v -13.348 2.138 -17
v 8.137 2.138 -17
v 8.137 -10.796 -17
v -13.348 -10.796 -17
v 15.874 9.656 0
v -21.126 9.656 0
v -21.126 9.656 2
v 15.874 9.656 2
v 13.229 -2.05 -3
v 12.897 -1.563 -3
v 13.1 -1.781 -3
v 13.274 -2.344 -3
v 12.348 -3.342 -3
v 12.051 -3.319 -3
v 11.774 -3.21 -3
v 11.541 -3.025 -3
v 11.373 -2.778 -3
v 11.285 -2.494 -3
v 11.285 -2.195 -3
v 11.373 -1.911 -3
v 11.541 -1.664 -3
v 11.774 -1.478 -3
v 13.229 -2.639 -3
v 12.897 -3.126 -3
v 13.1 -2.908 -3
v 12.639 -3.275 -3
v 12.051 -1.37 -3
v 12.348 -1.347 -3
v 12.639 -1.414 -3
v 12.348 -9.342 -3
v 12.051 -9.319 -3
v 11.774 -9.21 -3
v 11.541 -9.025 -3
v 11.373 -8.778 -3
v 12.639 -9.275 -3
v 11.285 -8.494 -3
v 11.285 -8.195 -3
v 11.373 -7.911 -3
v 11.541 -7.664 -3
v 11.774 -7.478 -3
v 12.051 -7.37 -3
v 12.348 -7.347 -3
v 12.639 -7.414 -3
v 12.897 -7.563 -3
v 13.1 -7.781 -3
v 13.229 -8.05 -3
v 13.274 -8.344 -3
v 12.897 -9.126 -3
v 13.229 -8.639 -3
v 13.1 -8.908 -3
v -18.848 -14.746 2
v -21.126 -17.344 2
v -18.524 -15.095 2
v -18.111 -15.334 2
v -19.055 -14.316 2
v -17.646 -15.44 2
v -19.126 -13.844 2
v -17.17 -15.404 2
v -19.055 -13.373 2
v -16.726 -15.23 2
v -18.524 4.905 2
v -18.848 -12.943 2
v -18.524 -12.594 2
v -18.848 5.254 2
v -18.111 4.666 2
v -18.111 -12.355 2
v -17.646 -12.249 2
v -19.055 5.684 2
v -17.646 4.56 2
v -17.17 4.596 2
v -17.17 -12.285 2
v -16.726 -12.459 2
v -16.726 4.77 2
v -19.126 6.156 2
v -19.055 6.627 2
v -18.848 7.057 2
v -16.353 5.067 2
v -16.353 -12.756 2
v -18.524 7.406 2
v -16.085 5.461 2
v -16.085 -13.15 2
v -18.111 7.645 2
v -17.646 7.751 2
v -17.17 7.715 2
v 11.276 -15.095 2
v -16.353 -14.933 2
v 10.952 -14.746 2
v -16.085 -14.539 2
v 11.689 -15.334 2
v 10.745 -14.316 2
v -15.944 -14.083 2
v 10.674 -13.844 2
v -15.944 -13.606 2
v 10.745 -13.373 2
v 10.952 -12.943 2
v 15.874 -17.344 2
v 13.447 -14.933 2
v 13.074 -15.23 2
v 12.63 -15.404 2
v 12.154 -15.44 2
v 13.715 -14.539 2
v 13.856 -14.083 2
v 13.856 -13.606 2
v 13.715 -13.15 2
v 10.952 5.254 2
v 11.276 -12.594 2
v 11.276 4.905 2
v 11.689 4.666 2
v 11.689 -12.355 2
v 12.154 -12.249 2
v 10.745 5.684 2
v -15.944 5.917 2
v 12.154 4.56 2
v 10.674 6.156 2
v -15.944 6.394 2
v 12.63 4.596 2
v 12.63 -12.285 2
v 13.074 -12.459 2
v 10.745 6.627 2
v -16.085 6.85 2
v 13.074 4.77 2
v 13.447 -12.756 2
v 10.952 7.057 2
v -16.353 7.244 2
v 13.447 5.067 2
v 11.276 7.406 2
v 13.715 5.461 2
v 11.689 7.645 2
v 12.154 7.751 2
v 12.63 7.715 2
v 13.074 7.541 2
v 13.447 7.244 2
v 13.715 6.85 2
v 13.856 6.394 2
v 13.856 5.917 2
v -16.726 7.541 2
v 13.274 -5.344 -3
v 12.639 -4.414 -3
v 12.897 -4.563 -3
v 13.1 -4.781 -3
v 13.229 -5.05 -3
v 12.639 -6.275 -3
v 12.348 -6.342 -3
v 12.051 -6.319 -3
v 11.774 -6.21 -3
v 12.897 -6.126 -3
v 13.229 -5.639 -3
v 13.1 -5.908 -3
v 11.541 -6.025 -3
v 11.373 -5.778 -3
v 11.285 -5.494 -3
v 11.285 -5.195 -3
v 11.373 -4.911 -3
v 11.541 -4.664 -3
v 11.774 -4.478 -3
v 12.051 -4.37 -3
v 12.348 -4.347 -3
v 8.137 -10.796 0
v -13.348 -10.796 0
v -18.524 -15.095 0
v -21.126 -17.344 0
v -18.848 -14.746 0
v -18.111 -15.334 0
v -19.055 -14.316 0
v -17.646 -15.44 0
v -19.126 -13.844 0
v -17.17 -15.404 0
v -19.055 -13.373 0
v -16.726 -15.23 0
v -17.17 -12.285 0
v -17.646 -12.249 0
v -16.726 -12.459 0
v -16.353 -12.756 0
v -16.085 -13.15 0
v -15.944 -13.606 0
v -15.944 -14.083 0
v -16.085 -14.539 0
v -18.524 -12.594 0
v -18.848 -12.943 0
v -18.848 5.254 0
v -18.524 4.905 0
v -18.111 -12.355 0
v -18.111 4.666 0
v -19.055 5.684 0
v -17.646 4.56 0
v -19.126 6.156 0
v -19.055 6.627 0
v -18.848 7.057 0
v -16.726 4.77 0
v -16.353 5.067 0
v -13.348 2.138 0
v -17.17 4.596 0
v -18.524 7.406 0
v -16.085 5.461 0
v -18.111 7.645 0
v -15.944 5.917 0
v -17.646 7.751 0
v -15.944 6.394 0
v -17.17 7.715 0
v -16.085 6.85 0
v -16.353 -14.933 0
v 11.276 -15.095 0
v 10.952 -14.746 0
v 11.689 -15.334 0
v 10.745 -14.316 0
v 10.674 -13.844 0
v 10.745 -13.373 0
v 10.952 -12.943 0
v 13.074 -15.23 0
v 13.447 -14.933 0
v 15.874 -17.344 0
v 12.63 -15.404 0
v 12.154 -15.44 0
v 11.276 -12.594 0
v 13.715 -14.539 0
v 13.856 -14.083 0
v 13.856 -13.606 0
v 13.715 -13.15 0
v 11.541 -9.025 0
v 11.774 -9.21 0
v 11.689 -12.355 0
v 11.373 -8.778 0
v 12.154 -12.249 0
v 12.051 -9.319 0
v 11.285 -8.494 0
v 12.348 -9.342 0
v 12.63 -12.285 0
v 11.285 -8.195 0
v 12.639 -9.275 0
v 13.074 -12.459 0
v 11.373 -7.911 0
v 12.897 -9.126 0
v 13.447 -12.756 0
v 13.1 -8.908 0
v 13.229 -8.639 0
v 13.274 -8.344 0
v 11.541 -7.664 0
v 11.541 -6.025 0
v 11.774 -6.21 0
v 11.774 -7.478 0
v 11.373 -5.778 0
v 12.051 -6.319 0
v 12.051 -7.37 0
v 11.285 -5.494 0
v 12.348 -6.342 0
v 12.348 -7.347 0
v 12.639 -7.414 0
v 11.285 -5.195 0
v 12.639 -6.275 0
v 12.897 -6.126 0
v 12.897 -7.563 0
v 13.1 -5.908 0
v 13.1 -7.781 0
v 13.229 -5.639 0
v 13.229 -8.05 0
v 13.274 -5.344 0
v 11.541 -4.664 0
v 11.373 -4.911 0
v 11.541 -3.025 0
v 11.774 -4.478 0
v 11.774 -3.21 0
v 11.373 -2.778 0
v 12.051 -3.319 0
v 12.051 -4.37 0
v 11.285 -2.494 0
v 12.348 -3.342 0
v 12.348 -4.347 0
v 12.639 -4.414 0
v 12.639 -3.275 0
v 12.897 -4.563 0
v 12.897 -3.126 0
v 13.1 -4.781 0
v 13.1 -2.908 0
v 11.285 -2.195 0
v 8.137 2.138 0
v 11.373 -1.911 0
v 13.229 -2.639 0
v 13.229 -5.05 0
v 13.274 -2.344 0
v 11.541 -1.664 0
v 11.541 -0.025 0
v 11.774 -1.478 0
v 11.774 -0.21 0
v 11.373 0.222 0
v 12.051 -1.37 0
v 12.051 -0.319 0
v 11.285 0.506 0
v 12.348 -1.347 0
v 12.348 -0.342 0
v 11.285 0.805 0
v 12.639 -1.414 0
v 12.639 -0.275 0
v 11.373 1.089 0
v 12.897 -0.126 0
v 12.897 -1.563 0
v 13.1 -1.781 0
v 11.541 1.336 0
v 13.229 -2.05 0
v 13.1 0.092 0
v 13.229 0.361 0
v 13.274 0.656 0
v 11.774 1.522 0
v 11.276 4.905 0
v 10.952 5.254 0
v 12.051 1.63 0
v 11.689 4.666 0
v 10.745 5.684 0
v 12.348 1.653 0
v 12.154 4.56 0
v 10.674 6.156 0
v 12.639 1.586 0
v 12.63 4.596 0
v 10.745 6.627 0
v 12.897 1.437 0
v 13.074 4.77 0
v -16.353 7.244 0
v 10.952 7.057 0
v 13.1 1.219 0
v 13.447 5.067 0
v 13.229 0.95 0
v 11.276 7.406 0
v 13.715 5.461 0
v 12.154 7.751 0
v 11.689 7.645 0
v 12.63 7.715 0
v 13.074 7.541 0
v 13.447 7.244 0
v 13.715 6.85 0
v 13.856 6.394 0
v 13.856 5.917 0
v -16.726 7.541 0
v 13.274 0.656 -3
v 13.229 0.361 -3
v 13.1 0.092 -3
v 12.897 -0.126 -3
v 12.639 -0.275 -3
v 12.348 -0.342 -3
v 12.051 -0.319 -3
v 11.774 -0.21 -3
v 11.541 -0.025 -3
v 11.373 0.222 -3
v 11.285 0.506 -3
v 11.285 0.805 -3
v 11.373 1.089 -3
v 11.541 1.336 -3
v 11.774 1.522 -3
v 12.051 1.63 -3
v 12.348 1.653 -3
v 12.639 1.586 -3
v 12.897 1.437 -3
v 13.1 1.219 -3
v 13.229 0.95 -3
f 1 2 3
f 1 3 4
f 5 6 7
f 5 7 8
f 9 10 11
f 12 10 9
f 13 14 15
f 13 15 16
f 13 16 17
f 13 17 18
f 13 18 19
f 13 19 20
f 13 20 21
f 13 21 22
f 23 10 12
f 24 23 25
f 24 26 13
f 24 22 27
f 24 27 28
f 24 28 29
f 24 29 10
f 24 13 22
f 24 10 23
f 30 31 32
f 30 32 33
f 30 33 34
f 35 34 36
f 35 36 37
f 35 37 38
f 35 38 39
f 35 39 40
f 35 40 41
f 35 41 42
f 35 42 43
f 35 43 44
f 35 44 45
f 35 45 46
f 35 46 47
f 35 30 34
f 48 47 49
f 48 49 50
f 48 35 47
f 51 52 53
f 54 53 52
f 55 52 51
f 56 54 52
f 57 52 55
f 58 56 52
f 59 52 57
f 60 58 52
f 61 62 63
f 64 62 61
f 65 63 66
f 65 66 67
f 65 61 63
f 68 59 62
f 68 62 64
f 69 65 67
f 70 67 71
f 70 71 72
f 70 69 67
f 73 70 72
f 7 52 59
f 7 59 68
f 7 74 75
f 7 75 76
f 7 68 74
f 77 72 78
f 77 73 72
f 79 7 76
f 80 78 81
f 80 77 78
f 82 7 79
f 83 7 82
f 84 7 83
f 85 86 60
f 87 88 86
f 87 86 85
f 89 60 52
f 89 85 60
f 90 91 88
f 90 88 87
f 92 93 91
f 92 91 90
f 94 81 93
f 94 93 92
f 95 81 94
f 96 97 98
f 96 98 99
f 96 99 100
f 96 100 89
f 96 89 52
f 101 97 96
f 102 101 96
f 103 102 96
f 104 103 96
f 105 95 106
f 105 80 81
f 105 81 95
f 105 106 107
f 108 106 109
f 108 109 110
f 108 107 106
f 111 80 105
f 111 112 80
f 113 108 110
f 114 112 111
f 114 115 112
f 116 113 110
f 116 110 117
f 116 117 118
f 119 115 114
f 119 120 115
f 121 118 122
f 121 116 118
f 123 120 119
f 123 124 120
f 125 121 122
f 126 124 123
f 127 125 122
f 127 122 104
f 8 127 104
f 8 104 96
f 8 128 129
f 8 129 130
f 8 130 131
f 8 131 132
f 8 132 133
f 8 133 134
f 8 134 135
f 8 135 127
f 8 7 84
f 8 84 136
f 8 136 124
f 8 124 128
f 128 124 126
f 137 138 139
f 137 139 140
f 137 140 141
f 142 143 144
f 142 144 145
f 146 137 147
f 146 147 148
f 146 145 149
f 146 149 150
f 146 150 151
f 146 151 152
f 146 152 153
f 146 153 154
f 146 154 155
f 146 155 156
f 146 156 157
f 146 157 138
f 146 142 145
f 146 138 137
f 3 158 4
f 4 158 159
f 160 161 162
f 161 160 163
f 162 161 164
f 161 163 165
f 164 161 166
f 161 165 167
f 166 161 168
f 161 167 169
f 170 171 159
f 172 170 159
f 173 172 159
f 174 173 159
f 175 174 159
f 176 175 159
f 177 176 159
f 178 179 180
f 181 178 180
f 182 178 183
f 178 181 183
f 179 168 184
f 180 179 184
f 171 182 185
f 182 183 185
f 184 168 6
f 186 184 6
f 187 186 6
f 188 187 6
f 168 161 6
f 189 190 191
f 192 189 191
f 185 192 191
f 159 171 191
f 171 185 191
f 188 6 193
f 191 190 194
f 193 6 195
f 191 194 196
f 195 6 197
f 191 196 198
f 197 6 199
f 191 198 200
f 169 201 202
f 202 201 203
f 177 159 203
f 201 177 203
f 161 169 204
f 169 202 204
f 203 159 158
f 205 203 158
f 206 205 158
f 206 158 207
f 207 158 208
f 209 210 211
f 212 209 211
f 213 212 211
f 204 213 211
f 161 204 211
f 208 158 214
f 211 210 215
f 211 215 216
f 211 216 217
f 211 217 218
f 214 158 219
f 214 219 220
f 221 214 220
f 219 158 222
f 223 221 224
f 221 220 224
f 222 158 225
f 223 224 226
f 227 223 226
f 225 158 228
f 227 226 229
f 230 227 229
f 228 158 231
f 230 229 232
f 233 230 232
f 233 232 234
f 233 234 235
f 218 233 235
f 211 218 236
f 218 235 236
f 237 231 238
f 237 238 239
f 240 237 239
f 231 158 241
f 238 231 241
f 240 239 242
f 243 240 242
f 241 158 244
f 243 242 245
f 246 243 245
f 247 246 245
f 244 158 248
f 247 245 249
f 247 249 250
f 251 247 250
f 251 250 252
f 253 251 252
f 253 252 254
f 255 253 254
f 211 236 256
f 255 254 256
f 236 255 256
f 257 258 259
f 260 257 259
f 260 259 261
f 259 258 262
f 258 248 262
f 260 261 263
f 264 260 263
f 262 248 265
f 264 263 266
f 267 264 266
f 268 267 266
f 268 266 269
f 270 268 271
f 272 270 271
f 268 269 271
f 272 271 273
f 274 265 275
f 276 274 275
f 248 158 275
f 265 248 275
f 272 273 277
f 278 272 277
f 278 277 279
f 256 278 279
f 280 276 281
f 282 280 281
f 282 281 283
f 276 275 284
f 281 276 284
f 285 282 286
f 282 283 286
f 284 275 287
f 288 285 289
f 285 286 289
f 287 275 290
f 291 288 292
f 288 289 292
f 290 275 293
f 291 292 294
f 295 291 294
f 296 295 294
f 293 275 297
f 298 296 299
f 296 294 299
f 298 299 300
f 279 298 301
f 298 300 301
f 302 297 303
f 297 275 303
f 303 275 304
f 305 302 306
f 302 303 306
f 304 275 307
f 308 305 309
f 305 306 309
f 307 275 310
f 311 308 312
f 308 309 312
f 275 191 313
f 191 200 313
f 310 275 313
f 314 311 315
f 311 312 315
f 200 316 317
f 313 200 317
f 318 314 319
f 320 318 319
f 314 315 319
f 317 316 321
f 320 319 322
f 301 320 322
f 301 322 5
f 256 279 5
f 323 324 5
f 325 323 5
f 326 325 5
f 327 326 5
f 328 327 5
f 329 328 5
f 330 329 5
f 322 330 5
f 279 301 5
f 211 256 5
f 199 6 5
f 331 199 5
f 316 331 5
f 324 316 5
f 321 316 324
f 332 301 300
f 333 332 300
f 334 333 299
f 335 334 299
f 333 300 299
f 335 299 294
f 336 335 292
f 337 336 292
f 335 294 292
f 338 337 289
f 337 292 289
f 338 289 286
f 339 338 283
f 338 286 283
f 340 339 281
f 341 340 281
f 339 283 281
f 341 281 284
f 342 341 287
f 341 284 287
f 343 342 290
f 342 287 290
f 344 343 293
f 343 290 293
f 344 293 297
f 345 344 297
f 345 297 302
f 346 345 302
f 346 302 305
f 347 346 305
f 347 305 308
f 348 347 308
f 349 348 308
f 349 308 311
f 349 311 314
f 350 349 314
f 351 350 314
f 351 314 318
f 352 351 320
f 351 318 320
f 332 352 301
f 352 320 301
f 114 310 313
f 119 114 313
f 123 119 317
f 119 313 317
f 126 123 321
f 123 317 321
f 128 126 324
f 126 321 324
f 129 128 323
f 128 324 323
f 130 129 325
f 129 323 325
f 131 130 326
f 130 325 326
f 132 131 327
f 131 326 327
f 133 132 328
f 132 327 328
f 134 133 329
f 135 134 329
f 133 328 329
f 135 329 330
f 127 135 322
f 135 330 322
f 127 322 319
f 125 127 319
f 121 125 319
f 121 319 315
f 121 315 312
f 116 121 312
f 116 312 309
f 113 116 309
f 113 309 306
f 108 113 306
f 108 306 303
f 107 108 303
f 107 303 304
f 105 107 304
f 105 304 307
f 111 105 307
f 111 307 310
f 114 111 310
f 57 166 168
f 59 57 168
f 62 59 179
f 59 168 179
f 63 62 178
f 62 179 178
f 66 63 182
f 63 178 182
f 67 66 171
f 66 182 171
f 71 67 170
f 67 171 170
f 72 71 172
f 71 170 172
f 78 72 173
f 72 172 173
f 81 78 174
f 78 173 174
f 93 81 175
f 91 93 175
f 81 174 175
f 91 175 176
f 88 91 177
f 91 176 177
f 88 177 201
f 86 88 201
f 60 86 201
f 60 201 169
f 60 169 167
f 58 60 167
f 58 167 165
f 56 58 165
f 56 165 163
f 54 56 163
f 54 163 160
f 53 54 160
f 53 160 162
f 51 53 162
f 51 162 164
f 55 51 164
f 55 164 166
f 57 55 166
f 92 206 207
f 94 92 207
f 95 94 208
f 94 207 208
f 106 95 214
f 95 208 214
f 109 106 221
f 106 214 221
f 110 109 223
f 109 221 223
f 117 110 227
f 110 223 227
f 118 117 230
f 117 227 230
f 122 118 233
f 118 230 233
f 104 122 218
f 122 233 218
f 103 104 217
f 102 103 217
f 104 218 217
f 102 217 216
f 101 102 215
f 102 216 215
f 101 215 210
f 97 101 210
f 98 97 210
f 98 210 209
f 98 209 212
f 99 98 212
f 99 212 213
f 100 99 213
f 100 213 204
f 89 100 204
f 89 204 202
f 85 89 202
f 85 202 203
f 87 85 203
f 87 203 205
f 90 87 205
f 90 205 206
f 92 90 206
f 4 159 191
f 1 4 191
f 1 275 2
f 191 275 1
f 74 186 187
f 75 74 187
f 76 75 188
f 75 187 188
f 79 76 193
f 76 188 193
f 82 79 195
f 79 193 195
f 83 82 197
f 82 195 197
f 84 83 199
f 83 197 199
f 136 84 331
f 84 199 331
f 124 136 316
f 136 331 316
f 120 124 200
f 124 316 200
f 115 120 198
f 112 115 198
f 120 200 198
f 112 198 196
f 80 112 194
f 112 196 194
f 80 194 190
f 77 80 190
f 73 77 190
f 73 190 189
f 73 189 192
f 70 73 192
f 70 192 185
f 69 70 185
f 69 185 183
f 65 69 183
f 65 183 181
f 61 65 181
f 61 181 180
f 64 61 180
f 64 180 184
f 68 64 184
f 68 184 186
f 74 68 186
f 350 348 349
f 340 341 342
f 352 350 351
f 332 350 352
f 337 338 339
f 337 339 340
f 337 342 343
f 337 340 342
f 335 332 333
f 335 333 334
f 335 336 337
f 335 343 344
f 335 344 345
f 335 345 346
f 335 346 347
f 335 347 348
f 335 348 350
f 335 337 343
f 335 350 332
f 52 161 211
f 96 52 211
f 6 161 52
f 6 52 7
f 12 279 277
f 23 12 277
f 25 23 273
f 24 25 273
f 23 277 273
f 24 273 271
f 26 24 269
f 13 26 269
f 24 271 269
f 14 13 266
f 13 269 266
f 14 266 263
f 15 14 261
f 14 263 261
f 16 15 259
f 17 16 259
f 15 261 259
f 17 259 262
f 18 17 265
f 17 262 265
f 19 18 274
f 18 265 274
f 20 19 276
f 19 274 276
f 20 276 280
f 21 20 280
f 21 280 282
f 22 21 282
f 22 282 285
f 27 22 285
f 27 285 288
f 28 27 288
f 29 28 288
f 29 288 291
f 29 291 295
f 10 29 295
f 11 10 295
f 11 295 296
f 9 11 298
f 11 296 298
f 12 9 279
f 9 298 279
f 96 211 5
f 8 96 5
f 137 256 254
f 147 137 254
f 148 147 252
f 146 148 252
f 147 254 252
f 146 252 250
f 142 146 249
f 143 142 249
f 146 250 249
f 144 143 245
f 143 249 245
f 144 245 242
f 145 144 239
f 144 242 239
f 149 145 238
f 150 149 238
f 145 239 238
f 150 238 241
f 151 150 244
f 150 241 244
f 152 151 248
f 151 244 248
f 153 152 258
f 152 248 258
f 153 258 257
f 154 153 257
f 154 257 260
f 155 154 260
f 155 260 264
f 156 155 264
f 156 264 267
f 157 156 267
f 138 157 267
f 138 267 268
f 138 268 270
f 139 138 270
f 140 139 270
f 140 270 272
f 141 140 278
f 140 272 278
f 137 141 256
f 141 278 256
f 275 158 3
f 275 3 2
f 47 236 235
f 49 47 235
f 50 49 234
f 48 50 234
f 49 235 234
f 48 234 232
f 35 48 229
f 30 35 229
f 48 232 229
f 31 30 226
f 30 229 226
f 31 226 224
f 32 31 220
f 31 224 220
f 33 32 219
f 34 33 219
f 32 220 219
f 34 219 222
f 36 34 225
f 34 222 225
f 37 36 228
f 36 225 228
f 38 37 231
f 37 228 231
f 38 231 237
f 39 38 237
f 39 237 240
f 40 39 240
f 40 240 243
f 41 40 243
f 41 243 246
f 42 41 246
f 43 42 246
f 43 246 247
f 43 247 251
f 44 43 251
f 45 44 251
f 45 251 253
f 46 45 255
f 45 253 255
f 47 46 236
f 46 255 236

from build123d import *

# Parameters (mm, degrees)
SKETCH_1_W          = 37
SKETCH_1_H          = 27
EXTRUDE_1_DEPTH     = 2
SKETCH_2_R          = 1.6
CUT_EXTRUDE_1_DEPTH = 28.407139806
SKETCH_3_W          = 21.485092325
SKETCH_3_H          = 12.933183026
EXTRUDE_2_DEPTH     = 17
SKETCH_4_R          = 1
EXTRUDE_3_DEPTH     = 3


with BuildPart() as part:
    # 草圖1 → 填料-伸長1 (new body)
    with BuildSketch(Plane.XY):
        with Locations((-2.626304802, -3.844467641)):
            Rectangle(SKETCH_1_W, SKETCH_1_H)
    extrude(amount=EXTRUDE_1_DEPTH)

    # 草圖2 → 除料-伸長1 (cut, through all)
    with BuildSketch(Plane(origin=(0, 0, 0), x_dir=(-1, 0, 0), z_dir=(0, 0, -1))):
        with Locations((-12.273695198, 6.155532359)):
            Circle(SKETCH_2_R)
        with Locations((-12.273695198, -13.844467641)):
            Circle(SKETCH_2_R)
        with Locations((17.526304802, -13.844467641)):
            Circle(SKETCH_2_R)
        with Locations((17.526304802, 6.155532359)):
            Circle(SKETCH_2_R)
    extrude(amount=-CUT_EXTRUDE_1_DEPTH, mode=Mode.SUBTRACT)

    # 草圖3 → 填料-伸長2 (add)
    with BuildSketch(Plane(origin=(0, 0, 0), x_dir=(-1, 0, 0), z_dir=(0, 0, -1))):
        with Locations((2.605240986, -4.328935409)):
            Rectangle(SKETCH_3_W, SKETCH_3_H)
    extrude(amount=EXTRUDE_2_DEPTH)

    # 草圖4 → 填料-伸長3 (add)
    with BuildSketch(Plane(origin=(0, 0, 0), x_dir=(-1, 0, 0), z_dir=(0, 0, -1))):
        with Locations(Location((-12.273695198, -2.344467641, 0), (0, 0, 180))):
            Circle(SKETCH_4_R)
        with Locations(Location((-12.273695198, -5.344467641, 0), (0, 0, 180))):
            Circle(SKETCH_4_R)
        with Locations(Location((-12.273695198, -8.344467641, 0), (0, 0, 180))):
            Circle(SKETCH_4_R)
        with Locations(Location((-12.273695198, 0.655532359, 0), (0, 0, 180))):
            Circle(SKETCH_4_R)
    extrude(amount=EXTRUDE_3_DEPTH)


solid = part.part
